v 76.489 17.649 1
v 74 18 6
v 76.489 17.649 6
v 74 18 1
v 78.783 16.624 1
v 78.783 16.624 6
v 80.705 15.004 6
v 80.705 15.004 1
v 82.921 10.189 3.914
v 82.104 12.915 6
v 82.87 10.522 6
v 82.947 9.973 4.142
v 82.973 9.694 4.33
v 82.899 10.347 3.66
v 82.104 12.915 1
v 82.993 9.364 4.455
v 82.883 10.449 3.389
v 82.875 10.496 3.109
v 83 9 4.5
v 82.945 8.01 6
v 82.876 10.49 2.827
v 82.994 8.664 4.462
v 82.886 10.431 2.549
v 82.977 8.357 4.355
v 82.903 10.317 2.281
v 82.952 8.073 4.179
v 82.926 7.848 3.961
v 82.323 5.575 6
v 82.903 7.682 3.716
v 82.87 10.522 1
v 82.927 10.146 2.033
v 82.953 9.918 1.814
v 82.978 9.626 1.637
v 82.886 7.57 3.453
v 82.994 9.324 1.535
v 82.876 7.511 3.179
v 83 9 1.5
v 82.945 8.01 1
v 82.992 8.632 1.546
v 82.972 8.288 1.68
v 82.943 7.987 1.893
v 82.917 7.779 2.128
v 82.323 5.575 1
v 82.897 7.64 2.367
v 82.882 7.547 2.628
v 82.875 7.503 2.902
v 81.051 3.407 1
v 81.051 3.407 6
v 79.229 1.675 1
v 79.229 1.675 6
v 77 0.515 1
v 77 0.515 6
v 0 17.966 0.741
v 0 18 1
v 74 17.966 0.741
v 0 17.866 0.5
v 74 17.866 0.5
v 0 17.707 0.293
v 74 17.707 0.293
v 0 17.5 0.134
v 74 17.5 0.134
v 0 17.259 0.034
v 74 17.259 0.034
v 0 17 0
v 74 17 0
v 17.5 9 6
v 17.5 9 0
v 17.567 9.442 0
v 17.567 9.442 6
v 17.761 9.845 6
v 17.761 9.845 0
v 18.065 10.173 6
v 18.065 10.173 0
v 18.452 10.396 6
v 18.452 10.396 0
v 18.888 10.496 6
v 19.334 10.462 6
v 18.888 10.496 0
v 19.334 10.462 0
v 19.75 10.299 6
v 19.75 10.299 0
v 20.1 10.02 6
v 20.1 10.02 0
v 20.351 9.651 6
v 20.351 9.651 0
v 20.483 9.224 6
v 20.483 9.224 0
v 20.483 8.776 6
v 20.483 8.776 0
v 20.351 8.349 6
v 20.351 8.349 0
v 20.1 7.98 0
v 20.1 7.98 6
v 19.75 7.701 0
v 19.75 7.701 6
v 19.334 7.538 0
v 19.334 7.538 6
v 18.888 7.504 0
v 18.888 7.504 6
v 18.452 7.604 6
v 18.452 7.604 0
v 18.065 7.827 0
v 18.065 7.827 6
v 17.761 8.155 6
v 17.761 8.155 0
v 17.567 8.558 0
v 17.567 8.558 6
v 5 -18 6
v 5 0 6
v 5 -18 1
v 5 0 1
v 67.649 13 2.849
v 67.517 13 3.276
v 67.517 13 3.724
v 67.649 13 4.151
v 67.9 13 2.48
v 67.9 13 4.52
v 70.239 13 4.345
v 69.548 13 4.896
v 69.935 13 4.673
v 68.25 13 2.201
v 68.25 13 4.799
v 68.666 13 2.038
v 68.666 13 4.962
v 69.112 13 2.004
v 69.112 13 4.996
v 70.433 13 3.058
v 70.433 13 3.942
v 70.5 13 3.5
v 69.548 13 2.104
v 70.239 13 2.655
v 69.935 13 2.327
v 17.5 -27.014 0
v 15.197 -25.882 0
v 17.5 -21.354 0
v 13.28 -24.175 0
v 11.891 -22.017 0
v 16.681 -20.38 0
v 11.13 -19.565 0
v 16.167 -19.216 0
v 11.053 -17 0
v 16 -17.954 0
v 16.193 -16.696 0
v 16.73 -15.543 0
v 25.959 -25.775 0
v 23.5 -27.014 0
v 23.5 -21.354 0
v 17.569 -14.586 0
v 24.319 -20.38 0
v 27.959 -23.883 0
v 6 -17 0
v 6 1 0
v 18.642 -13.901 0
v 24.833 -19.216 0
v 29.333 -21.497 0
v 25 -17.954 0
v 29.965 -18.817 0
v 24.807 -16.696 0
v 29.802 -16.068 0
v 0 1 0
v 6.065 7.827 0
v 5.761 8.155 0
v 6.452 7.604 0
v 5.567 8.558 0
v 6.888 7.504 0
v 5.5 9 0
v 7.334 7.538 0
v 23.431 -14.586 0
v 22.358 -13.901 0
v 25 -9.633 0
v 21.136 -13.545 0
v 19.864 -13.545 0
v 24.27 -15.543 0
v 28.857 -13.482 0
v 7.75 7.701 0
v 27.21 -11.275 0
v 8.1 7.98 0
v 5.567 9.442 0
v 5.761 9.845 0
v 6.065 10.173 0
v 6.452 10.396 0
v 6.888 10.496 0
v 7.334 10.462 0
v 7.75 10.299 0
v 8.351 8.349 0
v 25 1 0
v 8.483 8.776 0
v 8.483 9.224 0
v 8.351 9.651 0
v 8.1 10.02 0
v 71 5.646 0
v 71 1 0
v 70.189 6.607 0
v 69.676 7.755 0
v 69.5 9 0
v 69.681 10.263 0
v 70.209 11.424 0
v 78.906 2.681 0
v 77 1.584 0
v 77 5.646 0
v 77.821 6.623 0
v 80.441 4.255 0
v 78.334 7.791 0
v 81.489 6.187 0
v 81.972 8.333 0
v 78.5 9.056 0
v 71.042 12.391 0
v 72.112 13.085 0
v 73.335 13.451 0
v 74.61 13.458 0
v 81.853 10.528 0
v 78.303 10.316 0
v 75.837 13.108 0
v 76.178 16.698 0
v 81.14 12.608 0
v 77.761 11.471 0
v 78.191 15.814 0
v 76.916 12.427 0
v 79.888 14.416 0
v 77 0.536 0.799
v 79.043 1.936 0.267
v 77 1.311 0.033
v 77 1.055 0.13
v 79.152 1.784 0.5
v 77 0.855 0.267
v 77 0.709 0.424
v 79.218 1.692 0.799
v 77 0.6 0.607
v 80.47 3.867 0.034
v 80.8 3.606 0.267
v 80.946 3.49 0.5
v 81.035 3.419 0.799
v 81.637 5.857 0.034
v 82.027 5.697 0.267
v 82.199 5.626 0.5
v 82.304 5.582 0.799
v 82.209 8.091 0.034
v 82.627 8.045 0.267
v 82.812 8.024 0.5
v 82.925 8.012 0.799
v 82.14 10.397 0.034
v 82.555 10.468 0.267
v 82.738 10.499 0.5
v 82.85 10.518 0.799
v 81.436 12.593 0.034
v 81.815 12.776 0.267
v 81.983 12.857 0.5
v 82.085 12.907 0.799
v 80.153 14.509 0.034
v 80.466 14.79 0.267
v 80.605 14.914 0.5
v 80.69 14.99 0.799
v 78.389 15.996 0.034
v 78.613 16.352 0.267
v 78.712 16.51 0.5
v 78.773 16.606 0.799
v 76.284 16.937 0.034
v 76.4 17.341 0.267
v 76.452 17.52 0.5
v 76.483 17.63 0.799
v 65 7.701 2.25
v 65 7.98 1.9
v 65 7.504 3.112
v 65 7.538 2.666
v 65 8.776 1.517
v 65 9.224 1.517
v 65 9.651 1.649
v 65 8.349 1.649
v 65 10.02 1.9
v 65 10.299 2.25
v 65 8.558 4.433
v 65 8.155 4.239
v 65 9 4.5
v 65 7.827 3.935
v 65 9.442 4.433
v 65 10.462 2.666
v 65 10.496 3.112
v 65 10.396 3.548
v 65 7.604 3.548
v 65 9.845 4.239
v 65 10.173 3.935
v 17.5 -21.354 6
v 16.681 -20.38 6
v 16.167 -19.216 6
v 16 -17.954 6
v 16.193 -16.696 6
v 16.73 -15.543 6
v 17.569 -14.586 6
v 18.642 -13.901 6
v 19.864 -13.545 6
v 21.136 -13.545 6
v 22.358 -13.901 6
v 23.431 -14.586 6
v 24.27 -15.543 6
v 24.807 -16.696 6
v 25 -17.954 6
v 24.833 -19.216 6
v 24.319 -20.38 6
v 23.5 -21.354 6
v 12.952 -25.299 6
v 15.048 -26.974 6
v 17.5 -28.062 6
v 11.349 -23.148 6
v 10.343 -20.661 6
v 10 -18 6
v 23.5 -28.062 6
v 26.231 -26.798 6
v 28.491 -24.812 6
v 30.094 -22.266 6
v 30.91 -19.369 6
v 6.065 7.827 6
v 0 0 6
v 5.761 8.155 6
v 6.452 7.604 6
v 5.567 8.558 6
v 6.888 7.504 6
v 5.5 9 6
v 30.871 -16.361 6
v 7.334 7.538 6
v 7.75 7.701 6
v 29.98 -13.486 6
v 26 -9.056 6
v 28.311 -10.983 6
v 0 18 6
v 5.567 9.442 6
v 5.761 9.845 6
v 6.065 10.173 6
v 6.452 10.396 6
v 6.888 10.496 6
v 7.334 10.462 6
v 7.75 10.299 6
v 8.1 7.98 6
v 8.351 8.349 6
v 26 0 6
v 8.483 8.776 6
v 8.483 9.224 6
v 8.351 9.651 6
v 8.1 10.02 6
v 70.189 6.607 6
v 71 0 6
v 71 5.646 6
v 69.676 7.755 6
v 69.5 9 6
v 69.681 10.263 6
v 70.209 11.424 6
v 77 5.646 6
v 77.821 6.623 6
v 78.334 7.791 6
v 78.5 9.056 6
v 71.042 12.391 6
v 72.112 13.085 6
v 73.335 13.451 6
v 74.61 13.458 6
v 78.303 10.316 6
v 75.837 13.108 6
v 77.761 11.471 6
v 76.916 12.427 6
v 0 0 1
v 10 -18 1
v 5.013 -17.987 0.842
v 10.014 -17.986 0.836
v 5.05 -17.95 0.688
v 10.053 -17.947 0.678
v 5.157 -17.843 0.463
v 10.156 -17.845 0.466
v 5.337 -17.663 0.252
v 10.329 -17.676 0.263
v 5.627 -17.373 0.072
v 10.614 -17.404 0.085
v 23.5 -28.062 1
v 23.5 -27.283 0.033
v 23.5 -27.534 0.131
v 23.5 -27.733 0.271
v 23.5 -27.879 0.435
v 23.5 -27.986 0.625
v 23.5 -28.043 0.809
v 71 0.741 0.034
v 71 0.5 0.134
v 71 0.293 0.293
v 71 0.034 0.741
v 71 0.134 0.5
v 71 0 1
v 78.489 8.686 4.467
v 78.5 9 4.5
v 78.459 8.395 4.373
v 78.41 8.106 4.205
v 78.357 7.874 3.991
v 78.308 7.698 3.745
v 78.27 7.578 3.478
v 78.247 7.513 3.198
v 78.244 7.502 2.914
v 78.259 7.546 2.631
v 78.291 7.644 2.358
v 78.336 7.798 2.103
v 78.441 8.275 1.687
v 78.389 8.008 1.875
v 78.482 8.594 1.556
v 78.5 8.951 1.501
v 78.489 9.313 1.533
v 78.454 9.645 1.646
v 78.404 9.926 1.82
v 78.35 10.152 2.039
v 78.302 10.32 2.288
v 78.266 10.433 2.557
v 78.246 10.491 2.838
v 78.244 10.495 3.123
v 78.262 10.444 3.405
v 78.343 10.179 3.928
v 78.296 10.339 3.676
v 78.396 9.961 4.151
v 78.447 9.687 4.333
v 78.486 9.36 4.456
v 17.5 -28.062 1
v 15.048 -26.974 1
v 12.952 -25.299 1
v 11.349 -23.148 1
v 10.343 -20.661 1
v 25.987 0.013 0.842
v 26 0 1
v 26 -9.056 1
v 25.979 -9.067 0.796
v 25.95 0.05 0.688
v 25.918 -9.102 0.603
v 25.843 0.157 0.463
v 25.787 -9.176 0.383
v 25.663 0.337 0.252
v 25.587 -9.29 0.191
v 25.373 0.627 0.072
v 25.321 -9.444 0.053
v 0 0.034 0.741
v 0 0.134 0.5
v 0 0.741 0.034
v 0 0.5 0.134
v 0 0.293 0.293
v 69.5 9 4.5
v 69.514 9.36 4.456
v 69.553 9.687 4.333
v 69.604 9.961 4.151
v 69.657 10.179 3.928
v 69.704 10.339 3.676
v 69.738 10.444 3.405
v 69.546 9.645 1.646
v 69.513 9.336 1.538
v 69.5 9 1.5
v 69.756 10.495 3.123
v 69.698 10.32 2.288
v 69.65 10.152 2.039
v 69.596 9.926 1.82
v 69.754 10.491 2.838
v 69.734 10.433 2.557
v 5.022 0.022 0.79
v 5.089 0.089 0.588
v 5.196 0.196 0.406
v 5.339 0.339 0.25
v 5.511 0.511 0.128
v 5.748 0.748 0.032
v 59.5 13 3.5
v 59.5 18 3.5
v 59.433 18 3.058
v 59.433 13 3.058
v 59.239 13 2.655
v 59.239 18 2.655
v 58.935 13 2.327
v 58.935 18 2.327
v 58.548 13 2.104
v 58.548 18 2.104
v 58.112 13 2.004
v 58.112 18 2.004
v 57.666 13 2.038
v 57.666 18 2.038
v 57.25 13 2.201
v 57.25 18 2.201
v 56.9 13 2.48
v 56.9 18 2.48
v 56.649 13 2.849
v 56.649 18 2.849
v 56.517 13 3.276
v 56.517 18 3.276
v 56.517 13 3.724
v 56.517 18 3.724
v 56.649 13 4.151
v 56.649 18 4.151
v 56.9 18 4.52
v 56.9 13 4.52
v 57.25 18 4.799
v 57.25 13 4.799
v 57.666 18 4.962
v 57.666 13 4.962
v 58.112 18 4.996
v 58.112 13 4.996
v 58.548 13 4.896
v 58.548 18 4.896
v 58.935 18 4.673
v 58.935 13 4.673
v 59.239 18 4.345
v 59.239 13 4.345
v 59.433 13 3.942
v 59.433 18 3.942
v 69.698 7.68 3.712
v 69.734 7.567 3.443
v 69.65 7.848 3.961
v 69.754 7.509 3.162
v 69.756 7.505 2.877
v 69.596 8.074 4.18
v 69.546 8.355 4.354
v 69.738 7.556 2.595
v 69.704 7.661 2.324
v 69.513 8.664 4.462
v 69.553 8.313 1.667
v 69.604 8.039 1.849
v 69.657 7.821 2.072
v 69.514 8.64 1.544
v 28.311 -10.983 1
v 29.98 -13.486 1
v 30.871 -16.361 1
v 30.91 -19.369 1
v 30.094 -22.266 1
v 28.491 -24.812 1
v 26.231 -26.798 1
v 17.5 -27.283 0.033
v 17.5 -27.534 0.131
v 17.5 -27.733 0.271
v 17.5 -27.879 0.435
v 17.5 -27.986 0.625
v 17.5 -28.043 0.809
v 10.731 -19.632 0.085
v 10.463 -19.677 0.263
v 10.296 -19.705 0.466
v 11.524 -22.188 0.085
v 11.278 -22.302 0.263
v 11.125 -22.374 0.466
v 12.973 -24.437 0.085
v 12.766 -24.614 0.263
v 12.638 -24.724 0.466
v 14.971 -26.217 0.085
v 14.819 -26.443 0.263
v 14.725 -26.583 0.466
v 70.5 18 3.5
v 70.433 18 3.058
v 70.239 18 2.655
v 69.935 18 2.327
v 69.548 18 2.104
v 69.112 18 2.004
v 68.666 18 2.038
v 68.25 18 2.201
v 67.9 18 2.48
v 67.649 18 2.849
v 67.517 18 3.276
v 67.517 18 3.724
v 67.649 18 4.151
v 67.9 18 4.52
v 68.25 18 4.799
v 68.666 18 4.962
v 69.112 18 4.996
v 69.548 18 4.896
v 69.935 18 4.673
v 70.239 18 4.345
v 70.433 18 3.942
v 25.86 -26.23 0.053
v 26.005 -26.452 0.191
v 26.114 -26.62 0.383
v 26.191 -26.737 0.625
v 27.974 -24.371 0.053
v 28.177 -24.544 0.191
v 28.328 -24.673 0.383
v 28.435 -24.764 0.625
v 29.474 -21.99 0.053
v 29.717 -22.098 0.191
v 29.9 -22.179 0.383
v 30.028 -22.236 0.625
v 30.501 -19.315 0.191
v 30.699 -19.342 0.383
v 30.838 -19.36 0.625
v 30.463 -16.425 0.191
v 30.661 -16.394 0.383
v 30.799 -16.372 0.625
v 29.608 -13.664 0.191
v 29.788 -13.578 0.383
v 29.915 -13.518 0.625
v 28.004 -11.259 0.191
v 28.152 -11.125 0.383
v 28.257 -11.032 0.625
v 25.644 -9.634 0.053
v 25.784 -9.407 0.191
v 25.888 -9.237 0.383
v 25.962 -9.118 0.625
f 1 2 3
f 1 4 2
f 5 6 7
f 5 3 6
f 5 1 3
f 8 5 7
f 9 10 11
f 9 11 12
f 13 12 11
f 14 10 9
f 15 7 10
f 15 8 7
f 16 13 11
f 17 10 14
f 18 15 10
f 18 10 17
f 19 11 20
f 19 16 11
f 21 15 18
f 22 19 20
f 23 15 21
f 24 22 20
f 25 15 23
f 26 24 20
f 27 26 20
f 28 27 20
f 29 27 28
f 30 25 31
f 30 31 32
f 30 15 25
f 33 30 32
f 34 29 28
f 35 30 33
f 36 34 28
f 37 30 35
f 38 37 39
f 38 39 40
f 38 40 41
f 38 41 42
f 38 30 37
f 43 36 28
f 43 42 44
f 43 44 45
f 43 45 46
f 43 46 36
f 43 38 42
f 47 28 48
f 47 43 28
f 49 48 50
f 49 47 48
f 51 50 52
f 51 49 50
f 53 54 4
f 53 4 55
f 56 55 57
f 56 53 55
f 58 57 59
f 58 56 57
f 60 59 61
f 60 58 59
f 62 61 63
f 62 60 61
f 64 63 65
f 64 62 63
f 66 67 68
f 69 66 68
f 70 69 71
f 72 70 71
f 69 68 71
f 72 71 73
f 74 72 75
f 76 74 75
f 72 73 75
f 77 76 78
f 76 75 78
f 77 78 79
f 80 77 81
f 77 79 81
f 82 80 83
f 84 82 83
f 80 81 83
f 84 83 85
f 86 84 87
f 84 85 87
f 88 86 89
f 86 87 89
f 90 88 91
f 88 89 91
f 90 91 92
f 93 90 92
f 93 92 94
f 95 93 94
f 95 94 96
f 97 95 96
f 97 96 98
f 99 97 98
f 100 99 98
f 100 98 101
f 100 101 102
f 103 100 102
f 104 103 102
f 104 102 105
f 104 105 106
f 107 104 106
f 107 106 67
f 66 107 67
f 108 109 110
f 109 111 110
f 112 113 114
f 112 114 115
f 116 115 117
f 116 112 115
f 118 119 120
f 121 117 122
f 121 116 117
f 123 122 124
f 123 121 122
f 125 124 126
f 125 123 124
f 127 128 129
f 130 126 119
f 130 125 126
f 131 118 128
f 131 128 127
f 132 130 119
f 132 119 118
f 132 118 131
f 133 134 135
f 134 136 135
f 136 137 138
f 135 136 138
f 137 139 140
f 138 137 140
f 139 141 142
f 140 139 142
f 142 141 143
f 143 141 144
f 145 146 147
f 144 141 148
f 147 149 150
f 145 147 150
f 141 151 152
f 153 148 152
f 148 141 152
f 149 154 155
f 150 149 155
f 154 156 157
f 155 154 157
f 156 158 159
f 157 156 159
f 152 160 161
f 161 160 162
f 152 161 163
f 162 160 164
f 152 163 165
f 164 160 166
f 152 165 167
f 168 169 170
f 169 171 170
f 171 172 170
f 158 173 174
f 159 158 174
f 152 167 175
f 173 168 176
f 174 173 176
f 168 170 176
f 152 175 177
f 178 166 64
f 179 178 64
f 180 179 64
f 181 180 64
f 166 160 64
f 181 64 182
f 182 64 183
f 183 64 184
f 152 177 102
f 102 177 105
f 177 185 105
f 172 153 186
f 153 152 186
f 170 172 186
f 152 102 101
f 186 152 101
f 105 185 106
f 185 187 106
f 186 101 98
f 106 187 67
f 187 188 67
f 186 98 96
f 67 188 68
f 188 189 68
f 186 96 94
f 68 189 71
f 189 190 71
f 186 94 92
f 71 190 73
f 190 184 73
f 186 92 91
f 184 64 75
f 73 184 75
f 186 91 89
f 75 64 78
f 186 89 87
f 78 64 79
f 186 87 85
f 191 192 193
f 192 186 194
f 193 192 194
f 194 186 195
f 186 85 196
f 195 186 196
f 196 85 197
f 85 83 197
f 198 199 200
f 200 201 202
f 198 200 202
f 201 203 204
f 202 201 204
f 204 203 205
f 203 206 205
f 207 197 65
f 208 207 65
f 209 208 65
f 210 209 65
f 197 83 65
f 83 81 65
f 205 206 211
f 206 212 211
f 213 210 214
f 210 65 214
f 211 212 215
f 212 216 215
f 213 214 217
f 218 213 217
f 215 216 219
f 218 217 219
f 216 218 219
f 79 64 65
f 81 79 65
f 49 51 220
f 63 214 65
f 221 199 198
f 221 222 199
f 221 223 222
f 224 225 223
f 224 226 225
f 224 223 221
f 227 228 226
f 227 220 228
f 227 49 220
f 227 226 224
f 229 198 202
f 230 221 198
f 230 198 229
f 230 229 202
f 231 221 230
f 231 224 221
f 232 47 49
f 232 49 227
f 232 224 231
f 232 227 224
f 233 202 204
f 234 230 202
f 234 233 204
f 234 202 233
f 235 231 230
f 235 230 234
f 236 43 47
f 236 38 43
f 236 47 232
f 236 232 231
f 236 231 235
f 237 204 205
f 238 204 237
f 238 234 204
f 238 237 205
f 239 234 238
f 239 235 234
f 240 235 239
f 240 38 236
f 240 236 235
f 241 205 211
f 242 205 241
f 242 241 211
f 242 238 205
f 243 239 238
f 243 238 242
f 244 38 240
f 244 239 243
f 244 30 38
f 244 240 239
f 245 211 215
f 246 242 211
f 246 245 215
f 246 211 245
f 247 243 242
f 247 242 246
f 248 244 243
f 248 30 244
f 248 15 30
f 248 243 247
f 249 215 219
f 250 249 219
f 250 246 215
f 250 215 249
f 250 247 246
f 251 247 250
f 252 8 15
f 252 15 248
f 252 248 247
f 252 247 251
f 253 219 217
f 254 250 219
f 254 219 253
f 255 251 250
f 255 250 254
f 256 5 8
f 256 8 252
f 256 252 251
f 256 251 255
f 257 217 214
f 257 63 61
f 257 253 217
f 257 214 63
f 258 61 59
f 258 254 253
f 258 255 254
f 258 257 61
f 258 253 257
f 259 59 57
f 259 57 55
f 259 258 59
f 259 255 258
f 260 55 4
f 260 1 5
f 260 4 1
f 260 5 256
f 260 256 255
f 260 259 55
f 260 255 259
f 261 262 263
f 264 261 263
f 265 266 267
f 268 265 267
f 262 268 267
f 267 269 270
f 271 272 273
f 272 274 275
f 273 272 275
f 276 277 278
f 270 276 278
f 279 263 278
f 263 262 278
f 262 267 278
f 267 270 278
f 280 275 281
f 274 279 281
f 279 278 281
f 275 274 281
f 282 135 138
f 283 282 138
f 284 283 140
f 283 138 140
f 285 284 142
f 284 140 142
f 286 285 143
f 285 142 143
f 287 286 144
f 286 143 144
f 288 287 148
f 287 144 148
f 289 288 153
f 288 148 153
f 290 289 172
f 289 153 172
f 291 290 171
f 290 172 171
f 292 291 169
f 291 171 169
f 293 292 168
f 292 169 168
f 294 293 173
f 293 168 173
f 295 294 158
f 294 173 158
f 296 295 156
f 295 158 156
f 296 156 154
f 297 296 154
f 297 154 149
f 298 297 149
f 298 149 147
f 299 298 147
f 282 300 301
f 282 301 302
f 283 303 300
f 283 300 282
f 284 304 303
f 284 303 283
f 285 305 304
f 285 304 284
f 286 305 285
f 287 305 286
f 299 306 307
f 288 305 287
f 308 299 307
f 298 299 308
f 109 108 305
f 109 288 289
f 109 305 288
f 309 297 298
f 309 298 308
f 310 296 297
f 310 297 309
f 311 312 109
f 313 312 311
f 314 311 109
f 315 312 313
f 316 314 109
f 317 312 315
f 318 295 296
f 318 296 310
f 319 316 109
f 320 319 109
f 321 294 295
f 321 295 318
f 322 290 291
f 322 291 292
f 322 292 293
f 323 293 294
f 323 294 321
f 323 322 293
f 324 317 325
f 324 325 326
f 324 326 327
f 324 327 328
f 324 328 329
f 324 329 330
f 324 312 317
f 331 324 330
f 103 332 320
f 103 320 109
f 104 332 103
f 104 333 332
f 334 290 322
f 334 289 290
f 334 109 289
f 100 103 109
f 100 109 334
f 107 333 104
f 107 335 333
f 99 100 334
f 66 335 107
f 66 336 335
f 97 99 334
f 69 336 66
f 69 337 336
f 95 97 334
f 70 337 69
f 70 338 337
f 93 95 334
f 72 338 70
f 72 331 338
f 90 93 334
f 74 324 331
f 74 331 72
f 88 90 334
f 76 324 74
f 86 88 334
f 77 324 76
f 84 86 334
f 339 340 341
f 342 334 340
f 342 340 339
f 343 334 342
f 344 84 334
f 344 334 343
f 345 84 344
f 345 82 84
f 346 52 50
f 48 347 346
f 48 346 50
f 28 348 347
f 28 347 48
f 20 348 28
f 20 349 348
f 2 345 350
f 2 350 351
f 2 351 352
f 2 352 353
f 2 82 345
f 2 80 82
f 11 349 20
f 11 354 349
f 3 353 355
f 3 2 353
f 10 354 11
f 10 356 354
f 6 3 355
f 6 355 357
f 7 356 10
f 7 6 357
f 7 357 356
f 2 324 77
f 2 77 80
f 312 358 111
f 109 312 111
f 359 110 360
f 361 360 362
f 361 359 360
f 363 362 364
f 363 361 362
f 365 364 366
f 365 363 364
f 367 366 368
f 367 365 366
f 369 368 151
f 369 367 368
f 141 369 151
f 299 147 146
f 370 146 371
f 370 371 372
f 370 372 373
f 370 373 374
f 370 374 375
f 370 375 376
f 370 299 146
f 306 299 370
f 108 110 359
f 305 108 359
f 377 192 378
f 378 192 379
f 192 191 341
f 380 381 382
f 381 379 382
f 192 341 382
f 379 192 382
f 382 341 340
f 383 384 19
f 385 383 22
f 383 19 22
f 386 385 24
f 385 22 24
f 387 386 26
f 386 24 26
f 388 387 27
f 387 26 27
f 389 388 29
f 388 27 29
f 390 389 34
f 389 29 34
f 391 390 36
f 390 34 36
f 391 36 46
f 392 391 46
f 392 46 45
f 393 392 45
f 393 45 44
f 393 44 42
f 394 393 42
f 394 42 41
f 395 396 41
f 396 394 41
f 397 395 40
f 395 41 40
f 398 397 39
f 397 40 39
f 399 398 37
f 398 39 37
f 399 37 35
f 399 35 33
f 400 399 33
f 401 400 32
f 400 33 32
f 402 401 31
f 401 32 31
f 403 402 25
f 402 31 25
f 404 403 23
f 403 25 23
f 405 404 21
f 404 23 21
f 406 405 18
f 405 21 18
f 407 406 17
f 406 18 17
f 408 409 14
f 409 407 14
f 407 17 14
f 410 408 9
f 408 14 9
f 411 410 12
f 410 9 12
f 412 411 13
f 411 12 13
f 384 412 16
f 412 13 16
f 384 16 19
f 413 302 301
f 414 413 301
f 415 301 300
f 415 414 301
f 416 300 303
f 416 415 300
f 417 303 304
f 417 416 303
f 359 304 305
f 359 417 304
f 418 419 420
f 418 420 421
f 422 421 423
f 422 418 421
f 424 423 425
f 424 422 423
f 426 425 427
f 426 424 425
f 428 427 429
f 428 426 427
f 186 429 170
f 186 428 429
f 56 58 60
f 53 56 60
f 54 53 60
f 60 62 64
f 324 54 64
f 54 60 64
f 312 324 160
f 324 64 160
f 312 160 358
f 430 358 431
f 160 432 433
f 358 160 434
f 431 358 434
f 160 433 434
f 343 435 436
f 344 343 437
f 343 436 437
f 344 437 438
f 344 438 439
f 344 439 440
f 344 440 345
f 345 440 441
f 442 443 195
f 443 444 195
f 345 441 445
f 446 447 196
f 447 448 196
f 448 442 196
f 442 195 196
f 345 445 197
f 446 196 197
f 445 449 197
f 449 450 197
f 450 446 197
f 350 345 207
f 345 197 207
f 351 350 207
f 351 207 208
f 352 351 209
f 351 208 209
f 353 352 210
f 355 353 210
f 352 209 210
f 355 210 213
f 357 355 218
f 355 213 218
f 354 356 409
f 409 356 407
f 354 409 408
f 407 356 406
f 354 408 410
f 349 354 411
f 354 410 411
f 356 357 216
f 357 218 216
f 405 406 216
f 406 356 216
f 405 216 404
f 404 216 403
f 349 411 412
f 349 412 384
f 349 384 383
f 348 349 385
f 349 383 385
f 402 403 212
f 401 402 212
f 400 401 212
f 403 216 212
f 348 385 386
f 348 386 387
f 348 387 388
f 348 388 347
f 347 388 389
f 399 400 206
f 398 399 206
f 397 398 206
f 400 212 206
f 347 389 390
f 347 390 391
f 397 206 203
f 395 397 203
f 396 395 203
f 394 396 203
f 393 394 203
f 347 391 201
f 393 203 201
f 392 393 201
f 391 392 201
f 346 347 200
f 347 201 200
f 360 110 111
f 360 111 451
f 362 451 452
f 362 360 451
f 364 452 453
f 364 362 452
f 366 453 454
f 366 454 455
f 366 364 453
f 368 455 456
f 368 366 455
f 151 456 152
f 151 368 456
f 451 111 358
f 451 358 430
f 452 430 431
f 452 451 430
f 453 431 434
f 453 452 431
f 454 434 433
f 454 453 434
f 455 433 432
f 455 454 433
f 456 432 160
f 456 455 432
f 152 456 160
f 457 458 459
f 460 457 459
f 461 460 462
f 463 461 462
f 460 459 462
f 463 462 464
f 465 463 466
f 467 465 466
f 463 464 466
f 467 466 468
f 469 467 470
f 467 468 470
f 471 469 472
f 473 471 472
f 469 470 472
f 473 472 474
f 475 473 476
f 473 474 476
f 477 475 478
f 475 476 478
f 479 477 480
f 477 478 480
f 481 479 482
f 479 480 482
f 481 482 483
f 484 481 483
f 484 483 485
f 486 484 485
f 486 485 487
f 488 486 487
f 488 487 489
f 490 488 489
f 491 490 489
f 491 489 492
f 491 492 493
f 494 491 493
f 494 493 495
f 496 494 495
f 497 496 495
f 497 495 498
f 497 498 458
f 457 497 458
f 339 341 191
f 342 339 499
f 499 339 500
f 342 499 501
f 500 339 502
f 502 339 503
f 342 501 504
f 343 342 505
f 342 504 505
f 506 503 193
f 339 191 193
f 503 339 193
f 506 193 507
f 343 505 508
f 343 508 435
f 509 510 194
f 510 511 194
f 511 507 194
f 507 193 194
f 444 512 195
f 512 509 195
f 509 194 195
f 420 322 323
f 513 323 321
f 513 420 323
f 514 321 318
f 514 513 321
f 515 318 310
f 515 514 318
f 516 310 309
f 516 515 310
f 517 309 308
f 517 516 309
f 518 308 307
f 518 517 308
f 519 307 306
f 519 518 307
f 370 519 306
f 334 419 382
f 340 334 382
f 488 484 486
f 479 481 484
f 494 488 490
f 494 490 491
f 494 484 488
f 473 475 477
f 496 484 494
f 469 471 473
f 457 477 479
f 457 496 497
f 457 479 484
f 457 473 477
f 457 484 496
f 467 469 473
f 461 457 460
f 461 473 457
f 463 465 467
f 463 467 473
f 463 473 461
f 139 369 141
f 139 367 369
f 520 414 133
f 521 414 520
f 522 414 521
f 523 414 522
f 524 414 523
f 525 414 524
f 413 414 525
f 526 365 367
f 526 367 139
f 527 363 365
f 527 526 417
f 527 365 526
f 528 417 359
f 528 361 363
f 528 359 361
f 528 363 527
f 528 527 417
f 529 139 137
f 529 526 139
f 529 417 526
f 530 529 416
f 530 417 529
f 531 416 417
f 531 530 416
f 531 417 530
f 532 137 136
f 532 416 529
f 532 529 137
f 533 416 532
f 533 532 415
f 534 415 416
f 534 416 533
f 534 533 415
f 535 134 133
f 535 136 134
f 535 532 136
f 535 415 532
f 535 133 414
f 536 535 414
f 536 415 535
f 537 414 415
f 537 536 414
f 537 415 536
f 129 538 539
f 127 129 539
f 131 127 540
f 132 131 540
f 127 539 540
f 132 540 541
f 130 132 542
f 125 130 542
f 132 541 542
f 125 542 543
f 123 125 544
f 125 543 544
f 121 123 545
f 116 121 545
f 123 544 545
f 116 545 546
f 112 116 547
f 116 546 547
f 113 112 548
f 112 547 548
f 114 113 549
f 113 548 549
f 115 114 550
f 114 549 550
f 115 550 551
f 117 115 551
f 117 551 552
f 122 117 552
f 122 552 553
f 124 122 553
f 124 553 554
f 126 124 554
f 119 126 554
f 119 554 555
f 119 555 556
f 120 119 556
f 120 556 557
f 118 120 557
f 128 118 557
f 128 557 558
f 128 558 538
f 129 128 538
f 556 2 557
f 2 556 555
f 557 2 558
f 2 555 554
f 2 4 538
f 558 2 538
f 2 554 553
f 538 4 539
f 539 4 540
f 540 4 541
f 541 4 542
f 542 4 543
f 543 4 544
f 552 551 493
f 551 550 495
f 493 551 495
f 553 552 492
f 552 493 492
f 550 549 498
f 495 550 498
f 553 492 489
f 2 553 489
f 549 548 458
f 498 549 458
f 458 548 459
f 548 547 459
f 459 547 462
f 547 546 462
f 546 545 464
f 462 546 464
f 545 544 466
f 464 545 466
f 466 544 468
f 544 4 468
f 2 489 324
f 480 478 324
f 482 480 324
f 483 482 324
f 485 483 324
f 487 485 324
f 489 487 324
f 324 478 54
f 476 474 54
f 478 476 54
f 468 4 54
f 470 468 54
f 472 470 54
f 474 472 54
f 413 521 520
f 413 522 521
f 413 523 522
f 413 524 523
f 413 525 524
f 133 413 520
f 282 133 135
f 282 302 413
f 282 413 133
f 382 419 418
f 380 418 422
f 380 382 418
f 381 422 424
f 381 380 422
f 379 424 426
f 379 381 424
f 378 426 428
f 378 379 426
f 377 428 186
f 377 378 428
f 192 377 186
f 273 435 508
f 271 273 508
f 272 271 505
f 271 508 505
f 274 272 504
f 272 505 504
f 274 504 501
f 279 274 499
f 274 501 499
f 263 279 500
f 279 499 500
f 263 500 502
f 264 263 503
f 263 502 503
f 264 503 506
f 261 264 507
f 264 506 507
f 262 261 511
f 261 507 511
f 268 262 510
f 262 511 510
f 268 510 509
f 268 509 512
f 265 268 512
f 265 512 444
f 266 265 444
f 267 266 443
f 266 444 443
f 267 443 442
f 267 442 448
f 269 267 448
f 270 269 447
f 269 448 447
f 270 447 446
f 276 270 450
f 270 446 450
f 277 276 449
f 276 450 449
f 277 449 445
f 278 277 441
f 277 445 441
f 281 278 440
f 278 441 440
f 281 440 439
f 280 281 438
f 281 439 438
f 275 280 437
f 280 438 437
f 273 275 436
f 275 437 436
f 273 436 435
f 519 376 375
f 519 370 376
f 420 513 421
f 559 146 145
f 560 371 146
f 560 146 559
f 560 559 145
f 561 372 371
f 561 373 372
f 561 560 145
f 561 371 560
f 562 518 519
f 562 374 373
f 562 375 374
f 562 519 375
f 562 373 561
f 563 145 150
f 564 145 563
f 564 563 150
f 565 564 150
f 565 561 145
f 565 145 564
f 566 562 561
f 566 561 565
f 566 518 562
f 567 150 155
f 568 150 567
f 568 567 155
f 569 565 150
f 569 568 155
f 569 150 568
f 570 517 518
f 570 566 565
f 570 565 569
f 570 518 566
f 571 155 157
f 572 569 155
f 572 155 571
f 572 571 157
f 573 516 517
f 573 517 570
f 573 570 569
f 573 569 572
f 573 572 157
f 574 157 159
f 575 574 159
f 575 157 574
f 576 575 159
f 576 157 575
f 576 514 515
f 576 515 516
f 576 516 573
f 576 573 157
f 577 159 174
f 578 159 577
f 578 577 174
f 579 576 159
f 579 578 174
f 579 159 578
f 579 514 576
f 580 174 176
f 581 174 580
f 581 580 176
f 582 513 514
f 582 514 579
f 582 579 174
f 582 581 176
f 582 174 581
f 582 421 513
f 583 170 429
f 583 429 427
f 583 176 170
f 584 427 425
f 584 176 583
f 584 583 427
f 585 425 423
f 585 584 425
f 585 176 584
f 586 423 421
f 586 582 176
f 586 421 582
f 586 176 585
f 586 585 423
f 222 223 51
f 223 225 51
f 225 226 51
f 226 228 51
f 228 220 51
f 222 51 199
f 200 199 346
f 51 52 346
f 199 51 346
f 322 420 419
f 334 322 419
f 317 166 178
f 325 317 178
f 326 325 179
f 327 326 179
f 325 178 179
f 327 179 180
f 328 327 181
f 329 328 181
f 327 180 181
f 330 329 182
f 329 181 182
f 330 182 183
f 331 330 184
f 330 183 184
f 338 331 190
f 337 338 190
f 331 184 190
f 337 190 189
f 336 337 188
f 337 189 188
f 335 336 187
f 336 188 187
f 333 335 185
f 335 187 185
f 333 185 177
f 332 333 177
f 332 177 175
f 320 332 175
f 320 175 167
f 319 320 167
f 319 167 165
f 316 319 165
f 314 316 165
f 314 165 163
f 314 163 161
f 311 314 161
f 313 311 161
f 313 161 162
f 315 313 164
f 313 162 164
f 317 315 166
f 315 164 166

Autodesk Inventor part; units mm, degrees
ref_plane "YZ Plane" through (0, 0, 0) normal (1, 0, 0) x (0, 1, 0)
ref_plane "XZ Plane" through (0, 0, 0) normal (0, 1, 0) x (-1, 0, 0)
sketch "Sketch1" plane through (0, 0, 0) normal (0, 0, 1) x (1, 0, 0)
  line L0 (0, 0) -> (5, 0)
  line L1 (5, 0) -> (5, -18)
  line L2 (5, -18) -> (26, -18)
  line L3 (26, -18) -> (26, 0)
  line L4 (26, 0) -> (74, 0)
  arc A0 (74, 0) -> (74, 18) centre (74, 9) ccw
  line L5 (74, 18) -> (0, 18)
  line L6 (0, 18) -> (0, 0)
  circle A1 centre (20.5, -18) radius 10.5
  dimension "d0" = 5
  dimension "d1" = 18
  dimension "d2" = 21
  dimension "d3" = 18
  dimension "d4" = 48
  dimension "d5" = 18
  dimension "d6" = 9
  dimension "d7" = 74
  dimension "d8" = 21
extrude "Extrusion1" add sketch "Sketch1" along normal blind 6
sketch "Sketch2" plane through (0, 0, 0) normal (0, 0, -1) x (-1, 0, 0)
  circle A0 centre (-74, 9) radius 4.5
  arc A1 (-26, -9.0557) -> (-10, -18) centre (-20.5, -18) ccw projected
  circle A2 centre (-20.5, -18) radius 4.5
  point P0 (0, 0)
  dimension "d11" = 9
  dimension "d12" = 9
extrude "Extrusion2" cut sketch "Sketch2" against normal through all
sketch "Sketch3" plane through (0, 0, 0) normal (0, 0, -1) x (-1, 0, 0)
  circle A0 centre (-7, 9) radius 1.5
  circle A1 centre (-19, 9) radius 1.5
  point P0 (0, 0)
  dimension "d16" = 3
  dimension "d17" = 3
extrude "Extrusion3" cut sketch "Sketch3" against normal through all
ref_plane "Work Plane1" through (83, 0, 0) normal (-1, 0, 0) x (0, 0, 1)
sketch "Sketch4" plane through (83, 0, 0) normal (-1, 0, 0) x (0, 0, 1)
  circle A0 centre (3, 9) radius 1.5
  point P0 (0, 0)
  dimension "d22" = 3
extrude "Extrusion4" cut sketch "Sketch4" along normal blind 18
fillet "Fillet3" radius 1 8 edges at (83, 9, 0) (50, 0, 0) (37, 18, 0) (2.5, 0, 0) (5, -9, 0) (25.6235, -27.1652, 0) (7.5, -18, 0) (26, -4.5279, 0)
sketch "Sketch5" plane through (0, 18, 6) normal (0, 1, 0) x (1, 0, 0)
  circle A0 centre (69, 2.5) radius 1.5
  circle A1 centre (58, 2.5) radius 1.5
  point P0 (0, 6)
  dimension "d26" = 3
  dimension "d27" = 3
extrude "Extrusion5" cut sketch "Sketch5" against normal blind 5
sketch "Sketch6" plane through (0, 0, 6) normal (0, 0, 1) x (1, 0, 0)
  line L0 (71, 0) -> (77, 0)
  line L1 (77, 0) -> (77, 6)
  line L2 (77, 6) -> (71, 6)
  line L3 (71, 6) -> (71, 0)
  line L4 (17.5, -18) -> (23.5, -18)
  line L5 (23.5, -18) -> (23.5, -29)
  line L6 (23.5, -29) -> (17.5, -29)
  line L7 (17.5, -29) -> (17.5, -18)
  point P0 (0, 0)
  dimension "d30" = 6
  dimension "d31" = 6
  dimension "d32" = 6
  dimension "d33" = 11
extrude "Extrusion6" cut sketch "Sketch6" against normal through all
properties part number "Hand - Digit 0-1"
